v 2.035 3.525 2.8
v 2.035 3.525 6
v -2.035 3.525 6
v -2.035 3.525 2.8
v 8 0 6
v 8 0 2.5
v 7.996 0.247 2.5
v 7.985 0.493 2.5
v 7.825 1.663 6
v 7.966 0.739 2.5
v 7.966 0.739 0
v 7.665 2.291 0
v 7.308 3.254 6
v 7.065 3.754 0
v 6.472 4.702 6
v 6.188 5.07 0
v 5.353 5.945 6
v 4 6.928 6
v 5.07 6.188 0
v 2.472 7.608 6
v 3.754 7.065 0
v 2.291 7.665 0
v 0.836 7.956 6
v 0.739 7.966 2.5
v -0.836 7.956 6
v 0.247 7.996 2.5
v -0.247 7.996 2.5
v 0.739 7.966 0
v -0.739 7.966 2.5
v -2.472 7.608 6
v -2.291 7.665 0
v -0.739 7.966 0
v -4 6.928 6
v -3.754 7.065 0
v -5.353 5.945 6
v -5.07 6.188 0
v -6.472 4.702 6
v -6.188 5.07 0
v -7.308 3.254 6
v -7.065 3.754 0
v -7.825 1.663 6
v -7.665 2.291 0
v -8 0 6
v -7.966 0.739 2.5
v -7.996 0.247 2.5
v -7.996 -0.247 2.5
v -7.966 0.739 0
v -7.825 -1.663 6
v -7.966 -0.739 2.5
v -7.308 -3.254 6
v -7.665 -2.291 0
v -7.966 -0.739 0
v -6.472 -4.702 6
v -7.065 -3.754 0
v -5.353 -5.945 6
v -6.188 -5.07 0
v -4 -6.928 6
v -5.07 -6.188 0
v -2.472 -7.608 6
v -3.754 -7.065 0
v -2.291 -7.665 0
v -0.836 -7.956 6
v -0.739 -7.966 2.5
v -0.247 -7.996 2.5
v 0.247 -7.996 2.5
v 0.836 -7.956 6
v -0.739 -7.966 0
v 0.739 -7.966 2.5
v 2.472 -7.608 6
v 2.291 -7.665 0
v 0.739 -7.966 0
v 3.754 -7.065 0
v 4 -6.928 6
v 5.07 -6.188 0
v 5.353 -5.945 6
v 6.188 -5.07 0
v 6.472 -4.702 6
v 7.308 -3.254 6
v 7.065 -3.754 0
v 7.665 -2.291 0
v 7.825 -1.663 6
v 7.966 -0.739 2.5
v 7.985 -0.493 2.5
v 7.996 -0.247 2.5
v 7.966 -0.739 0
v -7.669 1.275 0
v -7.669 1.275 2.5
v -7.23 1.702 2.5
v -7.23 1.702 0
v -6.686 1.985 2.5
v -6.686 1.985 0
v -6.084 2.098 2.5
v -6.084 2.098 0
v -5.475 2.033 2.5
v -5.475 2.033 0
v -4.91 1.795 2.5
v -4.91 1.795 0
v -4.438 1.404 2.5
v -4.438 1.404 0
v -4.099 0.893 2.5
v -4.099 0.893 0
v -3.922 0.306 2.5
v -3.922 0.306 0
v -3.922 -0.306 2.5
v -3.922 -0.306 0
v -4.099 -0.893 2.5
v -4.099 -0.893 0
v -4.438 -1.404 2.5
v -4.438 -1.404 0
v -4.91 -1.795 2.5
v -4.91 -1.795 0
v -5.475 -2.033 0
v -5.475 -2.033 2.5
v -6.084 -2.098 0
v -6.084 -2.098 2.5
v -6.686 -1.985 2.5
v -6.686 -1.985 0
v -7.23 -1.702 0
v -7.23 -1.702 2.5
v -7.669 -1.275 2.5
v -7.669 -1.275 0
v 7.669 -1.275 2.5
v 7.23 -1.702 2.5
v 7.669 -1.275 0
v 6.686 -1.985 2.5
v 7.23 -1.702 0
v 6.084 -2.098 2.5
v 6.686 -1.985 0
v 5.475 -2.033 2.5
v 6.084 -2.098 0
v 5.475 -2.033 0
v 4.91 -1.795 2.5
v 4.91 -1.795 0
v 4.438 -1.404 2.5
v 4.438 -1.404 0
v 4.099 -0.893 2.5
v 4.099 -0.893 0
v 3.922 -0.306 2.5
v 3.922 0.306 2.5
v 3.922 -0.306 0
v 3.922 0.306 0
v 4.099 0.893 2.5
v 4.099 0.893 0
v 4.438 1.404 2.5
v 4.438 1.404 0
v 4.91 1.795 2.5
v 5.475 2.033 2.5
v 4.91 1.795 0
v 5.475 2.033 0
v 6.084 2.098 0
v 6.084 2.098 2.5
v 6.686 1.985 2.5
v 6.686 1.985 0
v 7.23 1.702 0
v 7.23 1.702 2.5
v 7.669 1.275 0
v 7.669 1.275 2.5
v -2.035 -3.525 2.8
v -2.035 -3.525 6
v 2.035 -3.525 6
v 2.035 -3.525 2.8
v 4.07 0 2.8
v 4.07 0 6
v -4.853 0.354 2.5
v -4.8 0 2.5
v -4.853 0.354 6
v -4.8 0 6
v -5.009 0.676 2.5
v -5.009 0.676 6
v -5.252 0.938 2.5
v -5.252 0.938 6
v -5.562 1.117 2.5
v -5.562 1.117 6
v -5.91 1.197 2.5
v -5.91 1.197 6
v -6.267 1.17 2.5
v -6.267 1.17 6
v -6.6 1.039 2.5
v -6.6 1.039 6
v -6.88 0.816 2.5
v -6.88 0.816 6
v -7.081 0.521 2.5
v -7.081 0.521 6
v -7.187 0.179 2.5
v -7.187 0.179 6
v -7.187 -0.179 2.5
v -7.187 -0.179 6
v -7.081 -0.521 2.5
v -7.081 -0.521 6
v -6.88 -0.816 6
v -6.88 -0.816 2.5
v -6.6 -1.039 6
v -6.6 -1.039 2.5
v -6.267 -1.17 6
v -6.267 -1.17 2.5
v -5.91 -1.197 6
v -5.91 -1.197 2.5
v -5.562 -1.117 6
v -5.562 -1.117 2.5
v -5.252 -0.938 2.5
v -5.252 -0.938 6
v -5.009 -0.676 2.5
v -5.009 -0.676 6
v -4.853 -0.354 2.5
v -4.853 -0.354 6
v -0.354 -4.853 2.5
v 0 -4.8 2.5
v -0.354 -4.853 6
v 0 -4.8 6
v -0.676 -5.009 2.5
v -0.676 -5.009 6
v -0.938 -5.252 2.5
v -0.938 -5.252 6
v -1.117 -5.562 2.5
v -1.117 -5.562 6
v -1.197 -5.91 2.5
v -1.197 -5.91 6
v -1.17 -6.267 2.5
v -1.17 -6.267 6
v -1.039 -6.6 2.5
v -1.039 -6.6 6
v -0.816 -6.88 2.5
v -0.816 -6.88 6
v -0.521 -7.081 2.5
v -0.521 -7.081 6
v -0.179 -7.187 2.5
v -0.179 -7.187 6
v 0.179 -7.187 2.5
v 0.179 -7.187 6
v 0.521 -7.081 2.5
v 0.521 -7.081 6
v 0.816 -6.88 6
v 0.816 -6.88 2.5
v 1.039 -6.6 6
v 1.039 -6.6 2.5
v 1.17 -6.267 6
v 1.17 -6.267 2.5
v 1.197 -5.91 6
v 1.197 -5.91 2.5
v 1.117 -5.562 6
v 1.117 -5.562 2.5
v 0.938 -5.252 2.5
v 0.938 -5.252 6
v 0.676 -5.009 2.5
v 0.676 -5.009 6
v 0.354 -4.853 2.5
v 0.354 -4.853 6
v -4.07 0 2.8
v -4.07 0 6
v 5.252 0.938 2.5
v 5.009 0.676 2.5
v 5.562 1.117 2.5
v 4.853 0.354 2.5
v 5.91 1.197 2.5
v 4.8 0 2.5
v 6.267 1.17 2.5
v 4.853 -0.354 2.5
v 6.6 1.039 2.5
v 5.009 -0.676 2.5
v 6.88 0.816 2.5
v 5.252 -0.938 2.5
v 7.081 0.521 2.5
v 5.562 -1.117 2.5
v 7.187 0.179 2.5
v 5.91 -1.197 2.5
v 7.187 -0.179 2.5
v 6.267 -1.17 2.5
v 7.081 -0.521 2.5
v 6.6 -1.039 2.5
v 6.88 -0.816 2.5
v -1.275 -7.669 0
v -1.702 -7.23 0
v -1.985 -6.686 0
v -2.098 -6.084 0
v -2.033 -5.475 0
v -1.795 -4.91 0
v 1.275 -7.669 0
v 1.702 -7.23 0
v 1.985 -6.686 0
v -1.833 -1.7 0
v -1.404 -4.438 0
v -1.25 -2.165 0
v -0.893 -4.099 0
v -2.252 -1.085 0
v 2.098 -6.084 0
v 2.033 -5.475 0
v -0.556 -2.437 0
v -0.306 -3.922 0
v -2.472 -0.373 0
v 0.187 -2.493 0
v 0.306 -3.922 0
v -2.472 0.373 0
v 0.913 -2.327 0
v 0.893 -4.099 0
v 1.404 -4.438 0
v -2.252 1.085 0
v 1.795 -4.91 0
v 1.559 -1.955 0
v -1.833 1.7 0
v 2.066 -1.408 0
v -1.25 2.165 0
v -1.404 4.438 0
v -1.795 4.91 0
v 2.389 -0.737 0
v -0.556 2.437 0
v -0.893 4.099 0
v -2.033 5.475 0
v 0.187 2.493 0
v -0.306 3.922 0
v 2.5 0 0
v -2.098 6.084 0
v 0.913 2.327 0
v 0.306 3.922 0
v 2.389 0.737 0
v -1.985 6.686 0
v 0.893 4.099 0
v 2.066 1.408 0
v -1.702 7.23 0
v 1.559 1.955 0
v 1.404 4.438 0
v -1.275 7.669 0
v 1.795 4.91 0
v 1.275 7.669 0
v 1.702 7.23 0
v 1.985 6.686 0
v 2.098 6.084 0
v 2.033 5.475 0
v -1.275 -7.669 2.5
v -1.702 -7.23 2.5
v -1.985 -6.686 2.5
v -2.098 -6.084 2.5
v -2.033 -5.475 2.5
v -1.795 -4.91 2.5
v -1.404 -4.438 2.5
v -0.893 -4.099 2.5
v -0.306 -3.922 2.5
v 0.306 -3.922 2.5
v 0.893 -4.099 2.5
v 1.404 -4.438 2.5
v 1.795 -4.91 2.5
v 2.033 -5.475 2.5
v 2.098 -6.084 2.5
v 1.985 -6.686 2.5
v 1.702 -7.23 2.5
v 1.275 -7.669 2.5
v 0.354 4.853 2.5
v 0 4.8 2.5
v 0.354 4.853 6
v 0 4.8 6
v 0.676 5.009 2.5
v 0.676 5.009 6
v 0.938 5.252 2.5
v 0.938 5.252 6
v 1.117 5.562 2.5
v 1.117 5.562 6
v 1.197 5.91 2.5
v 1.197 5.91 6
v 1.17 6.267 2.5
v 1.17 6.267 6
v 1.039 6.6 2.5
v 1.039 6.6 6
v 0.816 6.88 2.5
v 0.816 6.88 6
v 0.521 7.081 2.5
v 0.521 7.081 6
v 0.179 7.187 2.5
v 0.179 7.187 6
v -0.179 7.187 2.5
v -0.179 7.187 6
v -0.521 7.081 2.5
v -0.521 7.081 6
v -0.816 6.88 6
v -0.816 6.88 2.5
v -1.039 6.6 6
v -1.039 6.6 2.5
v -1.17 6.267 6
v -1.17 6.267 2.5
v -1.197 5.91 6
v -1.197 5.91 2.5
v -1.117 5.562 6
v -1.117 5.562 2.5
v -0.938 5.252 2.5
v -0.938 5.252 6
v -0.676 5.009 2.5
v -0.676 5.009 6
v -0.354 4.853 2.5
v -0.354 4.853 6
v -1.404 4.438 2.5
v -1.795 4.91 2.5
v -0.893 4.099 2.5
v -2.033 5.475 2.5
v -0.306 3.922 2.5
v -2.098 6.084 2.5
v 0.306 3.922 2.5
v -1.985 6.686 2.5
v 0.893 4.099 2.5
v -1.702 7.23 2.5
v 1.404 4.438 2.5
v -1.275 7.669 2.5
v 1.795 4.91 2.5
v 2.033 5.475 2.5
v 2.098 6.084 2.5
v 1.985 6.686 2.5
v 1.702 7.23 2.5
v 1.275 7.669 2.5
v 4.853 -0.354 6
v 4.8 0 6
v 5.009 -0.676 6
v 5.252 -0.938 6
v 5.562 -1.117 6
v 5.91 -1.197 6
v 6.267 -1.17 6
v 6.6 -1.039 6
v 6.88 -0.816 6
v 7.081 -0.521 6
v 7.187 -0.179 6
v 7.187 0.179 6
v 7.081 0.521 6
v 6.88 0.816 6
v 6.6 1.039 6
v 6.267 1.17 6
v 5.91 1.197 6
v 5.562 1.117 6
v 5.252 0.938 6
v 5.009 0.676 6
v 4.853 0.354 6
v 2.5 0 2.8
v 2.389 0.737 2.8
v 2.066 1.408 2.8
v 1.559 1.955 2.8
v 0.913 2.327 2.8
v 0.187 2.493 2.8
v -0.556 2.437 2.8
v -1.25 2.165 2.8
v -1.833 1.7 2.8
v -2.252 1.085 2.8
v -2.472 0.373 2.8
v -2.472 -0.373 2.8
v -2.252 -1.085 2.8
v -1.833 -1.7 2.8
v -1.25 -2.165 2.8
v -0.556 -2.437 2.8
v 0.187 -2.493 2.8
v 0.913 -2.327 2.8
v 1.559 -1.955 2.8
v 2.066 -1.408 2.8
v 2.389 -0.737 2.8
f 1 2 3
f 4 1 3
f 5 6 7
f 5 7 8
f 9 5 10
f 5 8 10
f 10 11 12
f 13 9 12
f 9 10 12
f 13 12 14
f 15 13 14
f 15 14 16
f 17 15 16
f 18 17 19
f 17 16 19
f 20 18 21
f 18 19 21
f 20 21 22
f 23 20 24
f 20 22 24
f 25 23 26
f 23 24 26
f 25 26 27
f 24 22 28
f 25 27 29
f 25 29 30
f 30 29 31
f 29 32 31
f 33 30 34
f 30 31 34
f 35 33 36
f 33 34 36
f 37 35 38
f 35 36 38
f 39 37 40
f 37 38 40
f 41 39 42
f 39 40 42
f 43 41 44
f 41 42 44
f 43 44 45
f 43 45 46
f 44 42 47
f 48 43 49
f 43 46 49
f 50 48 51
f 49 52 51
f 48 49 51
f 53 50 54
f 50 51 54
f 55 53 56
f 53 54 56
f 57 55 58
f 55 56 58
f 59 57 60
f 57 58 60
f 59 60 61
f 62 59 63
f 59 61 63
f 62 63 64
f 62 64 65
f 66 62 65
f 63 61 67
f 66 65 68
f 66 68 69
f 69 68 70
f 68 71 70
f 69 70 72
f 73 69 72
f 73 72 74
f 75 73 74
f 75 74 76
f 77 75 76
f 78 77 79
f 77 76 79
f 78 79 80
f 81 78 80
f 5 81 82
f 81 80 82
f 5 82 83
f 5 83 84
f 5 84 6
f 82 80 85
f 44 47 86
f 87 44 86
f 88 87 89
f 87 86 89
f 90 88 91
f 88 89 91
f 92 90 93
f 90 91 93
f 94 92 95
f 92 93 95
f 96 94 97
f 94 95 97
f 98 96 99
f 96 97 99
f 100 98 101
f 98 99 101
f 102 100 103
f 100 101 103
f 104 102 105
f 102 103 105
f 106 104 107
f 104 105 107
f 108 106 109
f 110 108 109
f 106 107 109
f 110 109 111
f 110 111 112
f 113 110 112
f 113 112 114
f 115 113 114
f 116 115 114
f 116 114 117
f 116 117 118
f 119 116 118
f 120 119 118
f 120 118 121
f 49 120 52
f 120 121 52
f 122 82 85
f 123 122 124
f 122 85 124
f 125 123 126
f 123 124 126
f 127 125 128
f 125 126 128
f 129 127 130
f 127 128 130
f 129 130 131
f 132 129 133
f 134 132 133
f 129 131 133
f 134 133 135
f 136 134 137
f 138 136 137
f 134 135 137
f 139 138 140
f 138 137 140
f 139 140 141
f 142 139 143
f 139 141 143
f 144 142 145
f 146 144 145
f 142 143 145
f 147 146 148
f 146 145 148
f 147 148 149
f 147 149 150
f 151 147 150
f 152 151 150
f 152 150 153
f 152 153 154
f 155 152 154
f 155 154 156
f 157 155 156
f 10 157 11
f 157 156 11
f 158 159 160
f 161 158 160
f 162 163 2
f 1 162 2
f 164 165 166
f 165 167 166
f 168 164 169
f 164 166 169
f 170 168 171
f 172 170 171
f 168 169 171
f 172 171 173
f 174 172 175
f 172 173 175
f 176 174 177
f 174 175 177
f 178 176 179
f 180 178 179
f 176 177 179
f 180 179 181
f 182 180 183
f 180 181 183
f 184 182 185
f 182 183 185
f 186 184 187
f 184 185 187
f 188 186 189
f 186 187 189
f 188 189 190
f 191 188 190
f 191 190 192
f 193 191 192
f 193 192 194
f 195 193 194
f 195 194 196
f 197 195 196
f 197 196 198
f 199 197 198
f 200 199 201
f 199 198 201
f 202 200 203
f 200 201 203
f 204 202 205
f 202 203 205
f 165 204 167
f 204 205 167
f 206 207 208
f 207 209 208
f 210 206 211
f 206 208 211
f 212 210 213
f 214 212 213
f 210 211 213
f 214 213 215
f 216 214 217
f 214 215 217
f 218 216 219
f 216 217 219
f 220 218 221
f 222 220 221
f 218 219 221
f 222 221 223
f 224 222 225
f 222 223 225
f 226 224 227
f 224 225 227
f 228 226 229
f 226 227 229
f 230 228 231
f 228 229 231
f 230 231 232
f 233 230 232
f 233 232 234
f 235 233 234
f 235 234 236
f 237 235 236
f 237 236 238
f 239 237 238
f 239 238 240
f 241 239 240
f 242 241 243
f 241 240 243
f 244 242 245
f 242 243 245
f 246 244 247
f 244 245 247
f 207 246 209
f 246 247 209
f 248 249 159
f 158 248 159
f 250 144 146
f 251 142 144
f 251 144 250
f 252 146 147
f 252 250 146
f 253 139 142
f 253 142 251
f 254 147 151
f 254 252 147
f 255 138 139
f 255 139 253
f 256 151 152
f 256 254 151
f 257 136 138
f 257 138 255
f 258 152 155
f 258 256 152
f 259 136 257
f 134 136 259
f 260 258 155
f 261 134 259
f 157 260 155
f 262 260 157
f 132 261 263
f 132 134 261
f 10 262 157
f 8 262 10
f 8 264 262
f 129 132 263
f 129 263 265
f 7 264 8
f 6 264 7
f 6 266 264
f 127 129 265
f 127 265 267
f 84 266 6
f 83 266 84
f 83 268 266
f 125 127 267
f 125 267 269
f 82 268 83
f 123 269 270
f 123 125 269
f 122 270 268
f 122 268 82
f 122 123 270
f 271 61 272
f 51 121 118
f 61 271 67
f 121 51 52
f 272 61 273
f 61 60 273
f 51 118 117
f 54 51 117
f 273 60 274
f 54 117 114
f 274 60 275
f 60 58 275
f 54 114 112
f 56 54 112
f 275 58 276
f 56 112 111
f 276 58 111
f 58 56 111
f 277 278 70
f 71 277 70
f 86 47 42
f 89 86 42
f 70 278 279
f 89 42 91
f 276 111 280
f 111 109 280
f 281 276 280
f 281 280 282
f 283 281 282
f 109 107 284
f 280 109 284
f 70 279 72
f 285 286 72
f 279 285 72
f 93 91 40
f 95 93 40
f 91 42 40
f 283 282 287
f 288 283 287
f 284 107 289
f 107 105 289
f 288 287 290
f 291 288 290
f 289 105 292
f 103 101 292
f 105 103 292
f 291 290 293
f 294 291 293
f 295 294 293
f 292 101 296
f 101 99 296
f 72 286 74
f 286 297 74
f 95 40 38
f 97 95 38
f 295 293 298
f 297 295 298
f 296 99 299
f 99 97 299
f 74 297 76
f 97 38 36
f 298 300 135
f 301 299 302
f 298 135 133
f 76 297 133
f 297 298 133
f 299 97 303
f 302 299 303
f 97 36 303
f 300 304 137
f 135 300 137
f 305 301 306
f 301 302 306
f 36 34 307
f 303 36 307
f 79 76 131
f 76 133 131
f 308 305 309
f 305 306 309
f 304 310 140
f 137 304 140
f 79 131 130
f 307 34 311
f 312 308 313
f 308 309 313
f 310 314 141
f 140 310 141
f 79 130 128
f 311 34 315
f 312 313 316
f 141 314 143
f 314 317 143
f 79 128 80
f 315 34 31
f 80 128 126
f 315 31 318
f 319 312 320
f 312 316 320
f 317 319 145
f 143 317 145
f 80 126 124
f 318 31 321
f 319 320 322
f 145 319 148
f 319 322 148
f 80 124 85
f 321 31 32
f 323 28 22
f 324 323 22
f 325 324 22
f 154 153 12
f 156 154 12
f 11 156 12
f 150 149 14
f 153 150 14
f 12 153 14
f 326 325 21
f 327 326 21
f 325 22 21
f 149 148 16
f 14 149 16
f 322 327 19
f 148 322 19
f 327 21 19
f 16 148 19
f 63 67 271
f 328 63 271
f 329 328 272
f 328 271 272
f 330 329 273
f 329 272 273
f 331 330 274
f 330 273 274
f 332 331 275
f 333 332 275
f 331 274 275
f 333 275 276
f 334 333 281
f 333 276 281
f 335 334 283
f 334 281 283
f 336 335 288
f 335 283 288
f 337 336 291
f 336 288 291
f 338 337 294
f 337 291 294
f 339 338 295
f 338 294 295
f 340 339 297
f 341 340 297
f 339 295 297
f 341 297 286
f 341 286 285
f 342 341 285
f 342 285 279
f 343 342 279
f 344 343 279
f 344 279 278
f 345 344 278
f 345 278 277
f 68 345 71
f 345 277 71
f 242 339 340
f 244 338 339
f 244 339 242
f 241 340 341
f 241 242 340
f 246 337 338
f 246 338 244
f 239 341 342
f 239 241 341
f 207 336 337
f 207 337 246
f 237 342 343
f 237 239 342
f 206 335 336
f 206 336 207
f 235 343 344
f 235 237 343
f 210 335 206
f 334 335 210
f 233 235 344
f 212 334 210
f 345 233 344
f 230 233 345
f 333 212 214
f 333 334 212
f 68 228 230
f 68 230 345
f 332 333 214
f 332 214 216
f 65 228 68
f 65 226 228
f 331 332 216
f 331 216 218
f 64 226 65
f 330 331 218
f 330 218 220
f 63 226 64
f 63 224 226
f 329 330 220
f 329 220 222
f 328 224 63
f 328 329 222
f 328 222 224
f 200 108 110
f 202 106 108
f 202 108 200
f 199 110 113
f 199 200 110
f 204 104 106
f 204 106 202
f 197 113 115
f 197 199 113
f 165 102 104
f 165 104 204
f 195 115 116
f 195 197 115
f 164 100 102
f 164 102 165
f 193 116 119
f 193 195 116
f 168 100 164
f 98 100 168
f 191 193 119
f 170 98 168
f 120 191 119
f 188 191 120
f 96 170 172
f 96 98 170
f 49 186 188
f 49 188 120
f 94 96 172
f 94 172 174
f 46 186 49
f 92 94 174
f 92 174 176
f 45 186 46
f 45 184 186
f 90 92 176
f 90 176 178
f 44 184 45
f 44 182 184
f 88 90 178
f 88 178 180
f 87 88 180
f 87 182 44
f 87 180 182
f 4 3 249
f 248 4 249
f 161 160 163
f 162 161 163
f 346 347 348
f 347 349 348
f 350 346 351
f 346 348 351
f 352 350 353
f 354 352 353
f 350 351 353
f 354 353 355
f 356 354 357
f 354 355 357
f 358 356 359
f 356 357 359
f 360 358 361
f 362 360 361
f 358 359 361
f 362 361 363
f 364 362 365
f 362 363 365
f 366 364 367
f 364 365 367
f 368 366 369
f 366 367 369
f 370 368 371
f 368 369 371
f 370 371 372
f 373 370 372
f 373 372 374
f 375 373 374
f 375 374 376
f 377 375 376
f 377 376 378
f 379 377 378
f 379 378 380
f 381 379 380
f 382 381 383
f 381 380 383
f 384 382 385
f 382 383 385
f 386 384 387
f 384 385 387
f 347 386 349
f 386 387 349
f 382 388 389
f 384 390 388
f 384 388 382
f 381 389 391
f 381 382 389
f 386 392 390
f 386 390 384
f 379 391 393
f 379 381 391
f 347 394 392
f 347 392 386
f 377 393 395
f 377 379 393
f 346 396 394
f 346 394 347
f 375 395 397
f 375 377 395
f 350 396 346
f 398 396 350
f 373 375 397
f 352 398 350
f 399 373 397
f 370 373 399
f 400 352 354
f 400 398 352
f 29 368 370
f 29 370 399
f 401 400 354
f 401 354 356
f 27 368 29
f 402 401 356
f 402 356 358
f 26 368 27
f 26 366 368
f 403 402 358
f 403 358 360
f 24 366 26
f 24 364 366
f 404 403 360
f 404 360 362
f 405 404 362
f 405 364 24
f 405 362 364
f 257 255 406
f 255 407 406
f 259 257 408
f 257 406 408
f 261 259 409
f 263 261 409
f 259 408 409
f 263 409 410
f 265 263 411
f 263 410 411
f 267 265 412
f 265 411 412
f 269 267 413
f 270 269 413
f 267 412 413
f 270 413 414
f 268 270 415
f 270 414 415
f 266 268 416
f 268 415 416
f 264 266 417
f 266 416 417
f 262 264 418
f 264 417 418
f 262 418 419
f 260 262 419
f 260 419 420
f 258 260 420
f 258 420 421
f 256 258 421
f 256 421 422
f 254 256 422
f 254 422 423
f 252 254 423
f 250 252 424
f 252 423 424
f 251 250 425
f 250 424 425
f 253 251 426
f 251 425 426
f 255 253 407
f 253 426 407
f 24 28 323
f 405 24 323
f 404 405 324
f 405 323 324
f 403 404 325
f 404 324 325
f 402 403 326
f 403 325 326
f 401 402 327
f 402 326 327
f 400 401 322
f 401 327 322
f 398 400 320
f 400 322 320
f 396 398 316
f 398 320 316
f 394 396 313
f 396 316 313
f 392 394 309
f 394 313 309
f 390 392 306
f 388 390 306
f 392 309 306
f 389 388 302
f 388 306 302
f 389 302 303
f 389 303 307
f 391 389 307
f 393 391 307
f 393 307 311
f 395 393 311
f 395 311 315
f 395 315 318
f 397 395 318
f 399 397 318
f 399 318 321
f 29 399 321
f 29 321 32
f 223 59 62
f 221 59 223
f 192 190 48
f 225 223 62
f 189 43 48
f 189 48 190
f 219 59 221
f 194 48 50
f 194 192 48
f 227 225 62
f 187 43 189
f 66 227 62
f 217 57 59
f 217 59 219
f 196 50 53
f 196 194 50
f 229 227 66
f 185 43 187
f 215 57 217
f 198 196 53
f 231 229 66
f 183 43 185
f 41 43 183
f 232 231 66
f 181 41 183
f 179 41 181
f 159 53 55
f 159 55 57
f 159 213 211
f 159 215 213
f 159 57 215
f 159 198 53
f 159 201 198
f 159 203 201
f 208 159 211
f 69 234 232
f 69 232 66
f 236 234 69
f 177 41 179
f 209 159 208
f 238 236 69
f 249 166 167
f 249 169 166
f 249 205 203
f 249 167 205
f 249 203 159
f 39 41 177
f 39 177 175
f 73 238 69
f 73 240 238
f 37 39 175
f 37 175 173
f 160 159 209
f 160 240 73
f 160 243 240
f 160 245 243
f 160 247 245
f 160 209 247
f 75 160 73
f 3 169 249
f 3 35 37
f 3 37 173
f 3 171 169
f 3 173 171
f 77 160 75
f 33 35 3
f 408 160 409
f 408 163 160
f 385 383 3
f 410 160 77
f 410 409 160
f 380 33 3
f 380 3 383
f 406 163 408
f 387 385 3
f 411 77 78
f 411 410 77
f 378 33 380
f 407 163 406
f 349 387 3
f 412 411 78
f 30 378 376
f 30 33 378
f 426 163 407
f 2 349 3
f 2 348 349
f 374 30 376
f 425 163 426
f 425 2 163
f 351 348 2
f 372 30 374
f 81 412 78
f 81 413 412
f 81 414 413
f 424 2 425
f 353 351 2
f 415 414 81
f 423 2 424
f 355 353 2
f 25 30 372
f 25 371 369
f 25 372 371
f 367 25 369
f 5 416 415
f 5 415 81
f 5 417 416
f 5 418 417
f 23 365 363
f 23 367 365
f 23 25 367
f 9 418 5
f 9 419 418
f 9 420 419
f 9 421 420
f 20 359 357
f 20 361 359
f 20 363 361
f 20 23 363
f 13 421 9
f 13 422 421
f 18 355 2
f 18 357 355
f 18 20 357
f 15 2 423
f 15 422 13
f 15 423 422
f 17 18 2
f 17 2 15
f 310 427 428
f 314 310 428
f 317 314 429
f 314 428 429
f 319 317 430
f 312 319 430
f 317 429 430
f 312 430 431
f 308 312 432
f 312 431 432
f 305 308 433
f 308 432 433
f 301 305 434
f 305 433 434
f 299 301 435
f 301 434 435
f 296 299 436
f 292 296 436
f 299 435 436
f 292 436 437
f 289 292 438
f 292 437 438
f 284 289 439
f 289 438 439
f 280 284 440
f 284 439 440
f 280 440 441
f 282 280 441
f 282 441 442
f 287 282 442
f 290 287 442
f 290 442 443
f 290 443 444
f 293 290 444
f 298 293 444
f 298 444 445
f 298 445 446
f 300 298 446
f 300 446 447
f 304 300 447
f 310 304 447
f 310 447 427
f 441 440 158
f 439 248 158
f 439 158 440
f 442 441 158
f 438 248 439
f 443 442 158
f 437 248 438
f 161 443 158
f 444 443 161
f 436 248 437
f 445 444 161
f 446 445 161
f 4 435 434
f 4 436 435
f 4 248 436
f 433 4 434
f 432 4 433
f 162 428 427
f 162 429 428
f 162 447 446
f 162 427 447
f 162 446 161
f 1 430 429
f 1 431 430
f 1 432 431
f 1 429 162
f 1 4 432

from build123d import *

# Parameters (mm, degrees)
SKETCH_1_R                   = 8
EXTRUDE_1_DEPTH              = 6
CUT_EXTRUDE_1_DEPTH          = 3.2
HOLE_WIZARD_M2_1_D           = 2.4
HOLE_WIZARD_M2_1_CBORE_D     = 4.2
HOLE_WIZARD_M2_1_CBORE_DEPTH = 2.5
PATTERN_CIRCULAR_1_COUNT     = 4
HOLE_WIZARD_M4_1_D           = 5


with BuildPart() as part:
    # ｽｹｯﾁ1 → ﾎﾞｽ - 押し出し1 (new body)
    with BuildSketch(Plane.XY):
        Circle(SKETCH_1_R)
    extrude(amount=EXTRUDE_1_DEPTH)

    # ｽｹｯﾁ2 → ｶｯﾄ - 押し出し1 (cut)
    with BuildSketch(Plane.XY.offset(6)):
        Polygon((4.070319398, 0), (2.035159699, 3.525), (-2.035159699, 3.525), (-4.070319398, 0), (-2.035159699, -3.525), (2.035159699, -3.525), align=None)
    extrude(amount=-CUT_EXTRUDE_1_DEPTH, mode=Mode.SUBTRACT)

    # M2 丸平ねじ用座ぐり穴1 (through all)
    with Locations(Plane(origin=(0, 0, 0), x_dir=(-1, 0, 0), z_dir=(0, 0, -1))):
        with Locations((6, 0)):
            hole_wizard_m2_1 = CounterBoreHole(HOLE_WIZARD_M2_1_D / 2, HOLE_WIZARD_M2_1_CBORE_D / 2, HOLE_WIZARD_M2_1_CBORE_DEPTH)

    # 円形ﾊﾟﾀｰﾝ1: M2 丸平ねじ用座ぐり穴1 ×4 about axis
    pattern_circular_1_axis = Axis((0, 0, 0), (0, 0, 1))
    for i in range(1, PATTERN_CIRCULAR_1_COUNT):
        add(hole_wizard_m2_1.rotate(pattern_circular_1_axis, i * 360 / PATTERN_CIRCULAR_1_COUNT), mode=Mode.SUBTRACT)

    # M4 すきま穴1 (through all)
    with Locations(Plane(origin=(0, 0, 0), x_dir=(-1, 0, 0), z_dir=(0, 0, -1))):
        with Locations((0, 0)):
            Hole(HOLE_WIZARD_M4_1_D / 2)


solid = part.part
